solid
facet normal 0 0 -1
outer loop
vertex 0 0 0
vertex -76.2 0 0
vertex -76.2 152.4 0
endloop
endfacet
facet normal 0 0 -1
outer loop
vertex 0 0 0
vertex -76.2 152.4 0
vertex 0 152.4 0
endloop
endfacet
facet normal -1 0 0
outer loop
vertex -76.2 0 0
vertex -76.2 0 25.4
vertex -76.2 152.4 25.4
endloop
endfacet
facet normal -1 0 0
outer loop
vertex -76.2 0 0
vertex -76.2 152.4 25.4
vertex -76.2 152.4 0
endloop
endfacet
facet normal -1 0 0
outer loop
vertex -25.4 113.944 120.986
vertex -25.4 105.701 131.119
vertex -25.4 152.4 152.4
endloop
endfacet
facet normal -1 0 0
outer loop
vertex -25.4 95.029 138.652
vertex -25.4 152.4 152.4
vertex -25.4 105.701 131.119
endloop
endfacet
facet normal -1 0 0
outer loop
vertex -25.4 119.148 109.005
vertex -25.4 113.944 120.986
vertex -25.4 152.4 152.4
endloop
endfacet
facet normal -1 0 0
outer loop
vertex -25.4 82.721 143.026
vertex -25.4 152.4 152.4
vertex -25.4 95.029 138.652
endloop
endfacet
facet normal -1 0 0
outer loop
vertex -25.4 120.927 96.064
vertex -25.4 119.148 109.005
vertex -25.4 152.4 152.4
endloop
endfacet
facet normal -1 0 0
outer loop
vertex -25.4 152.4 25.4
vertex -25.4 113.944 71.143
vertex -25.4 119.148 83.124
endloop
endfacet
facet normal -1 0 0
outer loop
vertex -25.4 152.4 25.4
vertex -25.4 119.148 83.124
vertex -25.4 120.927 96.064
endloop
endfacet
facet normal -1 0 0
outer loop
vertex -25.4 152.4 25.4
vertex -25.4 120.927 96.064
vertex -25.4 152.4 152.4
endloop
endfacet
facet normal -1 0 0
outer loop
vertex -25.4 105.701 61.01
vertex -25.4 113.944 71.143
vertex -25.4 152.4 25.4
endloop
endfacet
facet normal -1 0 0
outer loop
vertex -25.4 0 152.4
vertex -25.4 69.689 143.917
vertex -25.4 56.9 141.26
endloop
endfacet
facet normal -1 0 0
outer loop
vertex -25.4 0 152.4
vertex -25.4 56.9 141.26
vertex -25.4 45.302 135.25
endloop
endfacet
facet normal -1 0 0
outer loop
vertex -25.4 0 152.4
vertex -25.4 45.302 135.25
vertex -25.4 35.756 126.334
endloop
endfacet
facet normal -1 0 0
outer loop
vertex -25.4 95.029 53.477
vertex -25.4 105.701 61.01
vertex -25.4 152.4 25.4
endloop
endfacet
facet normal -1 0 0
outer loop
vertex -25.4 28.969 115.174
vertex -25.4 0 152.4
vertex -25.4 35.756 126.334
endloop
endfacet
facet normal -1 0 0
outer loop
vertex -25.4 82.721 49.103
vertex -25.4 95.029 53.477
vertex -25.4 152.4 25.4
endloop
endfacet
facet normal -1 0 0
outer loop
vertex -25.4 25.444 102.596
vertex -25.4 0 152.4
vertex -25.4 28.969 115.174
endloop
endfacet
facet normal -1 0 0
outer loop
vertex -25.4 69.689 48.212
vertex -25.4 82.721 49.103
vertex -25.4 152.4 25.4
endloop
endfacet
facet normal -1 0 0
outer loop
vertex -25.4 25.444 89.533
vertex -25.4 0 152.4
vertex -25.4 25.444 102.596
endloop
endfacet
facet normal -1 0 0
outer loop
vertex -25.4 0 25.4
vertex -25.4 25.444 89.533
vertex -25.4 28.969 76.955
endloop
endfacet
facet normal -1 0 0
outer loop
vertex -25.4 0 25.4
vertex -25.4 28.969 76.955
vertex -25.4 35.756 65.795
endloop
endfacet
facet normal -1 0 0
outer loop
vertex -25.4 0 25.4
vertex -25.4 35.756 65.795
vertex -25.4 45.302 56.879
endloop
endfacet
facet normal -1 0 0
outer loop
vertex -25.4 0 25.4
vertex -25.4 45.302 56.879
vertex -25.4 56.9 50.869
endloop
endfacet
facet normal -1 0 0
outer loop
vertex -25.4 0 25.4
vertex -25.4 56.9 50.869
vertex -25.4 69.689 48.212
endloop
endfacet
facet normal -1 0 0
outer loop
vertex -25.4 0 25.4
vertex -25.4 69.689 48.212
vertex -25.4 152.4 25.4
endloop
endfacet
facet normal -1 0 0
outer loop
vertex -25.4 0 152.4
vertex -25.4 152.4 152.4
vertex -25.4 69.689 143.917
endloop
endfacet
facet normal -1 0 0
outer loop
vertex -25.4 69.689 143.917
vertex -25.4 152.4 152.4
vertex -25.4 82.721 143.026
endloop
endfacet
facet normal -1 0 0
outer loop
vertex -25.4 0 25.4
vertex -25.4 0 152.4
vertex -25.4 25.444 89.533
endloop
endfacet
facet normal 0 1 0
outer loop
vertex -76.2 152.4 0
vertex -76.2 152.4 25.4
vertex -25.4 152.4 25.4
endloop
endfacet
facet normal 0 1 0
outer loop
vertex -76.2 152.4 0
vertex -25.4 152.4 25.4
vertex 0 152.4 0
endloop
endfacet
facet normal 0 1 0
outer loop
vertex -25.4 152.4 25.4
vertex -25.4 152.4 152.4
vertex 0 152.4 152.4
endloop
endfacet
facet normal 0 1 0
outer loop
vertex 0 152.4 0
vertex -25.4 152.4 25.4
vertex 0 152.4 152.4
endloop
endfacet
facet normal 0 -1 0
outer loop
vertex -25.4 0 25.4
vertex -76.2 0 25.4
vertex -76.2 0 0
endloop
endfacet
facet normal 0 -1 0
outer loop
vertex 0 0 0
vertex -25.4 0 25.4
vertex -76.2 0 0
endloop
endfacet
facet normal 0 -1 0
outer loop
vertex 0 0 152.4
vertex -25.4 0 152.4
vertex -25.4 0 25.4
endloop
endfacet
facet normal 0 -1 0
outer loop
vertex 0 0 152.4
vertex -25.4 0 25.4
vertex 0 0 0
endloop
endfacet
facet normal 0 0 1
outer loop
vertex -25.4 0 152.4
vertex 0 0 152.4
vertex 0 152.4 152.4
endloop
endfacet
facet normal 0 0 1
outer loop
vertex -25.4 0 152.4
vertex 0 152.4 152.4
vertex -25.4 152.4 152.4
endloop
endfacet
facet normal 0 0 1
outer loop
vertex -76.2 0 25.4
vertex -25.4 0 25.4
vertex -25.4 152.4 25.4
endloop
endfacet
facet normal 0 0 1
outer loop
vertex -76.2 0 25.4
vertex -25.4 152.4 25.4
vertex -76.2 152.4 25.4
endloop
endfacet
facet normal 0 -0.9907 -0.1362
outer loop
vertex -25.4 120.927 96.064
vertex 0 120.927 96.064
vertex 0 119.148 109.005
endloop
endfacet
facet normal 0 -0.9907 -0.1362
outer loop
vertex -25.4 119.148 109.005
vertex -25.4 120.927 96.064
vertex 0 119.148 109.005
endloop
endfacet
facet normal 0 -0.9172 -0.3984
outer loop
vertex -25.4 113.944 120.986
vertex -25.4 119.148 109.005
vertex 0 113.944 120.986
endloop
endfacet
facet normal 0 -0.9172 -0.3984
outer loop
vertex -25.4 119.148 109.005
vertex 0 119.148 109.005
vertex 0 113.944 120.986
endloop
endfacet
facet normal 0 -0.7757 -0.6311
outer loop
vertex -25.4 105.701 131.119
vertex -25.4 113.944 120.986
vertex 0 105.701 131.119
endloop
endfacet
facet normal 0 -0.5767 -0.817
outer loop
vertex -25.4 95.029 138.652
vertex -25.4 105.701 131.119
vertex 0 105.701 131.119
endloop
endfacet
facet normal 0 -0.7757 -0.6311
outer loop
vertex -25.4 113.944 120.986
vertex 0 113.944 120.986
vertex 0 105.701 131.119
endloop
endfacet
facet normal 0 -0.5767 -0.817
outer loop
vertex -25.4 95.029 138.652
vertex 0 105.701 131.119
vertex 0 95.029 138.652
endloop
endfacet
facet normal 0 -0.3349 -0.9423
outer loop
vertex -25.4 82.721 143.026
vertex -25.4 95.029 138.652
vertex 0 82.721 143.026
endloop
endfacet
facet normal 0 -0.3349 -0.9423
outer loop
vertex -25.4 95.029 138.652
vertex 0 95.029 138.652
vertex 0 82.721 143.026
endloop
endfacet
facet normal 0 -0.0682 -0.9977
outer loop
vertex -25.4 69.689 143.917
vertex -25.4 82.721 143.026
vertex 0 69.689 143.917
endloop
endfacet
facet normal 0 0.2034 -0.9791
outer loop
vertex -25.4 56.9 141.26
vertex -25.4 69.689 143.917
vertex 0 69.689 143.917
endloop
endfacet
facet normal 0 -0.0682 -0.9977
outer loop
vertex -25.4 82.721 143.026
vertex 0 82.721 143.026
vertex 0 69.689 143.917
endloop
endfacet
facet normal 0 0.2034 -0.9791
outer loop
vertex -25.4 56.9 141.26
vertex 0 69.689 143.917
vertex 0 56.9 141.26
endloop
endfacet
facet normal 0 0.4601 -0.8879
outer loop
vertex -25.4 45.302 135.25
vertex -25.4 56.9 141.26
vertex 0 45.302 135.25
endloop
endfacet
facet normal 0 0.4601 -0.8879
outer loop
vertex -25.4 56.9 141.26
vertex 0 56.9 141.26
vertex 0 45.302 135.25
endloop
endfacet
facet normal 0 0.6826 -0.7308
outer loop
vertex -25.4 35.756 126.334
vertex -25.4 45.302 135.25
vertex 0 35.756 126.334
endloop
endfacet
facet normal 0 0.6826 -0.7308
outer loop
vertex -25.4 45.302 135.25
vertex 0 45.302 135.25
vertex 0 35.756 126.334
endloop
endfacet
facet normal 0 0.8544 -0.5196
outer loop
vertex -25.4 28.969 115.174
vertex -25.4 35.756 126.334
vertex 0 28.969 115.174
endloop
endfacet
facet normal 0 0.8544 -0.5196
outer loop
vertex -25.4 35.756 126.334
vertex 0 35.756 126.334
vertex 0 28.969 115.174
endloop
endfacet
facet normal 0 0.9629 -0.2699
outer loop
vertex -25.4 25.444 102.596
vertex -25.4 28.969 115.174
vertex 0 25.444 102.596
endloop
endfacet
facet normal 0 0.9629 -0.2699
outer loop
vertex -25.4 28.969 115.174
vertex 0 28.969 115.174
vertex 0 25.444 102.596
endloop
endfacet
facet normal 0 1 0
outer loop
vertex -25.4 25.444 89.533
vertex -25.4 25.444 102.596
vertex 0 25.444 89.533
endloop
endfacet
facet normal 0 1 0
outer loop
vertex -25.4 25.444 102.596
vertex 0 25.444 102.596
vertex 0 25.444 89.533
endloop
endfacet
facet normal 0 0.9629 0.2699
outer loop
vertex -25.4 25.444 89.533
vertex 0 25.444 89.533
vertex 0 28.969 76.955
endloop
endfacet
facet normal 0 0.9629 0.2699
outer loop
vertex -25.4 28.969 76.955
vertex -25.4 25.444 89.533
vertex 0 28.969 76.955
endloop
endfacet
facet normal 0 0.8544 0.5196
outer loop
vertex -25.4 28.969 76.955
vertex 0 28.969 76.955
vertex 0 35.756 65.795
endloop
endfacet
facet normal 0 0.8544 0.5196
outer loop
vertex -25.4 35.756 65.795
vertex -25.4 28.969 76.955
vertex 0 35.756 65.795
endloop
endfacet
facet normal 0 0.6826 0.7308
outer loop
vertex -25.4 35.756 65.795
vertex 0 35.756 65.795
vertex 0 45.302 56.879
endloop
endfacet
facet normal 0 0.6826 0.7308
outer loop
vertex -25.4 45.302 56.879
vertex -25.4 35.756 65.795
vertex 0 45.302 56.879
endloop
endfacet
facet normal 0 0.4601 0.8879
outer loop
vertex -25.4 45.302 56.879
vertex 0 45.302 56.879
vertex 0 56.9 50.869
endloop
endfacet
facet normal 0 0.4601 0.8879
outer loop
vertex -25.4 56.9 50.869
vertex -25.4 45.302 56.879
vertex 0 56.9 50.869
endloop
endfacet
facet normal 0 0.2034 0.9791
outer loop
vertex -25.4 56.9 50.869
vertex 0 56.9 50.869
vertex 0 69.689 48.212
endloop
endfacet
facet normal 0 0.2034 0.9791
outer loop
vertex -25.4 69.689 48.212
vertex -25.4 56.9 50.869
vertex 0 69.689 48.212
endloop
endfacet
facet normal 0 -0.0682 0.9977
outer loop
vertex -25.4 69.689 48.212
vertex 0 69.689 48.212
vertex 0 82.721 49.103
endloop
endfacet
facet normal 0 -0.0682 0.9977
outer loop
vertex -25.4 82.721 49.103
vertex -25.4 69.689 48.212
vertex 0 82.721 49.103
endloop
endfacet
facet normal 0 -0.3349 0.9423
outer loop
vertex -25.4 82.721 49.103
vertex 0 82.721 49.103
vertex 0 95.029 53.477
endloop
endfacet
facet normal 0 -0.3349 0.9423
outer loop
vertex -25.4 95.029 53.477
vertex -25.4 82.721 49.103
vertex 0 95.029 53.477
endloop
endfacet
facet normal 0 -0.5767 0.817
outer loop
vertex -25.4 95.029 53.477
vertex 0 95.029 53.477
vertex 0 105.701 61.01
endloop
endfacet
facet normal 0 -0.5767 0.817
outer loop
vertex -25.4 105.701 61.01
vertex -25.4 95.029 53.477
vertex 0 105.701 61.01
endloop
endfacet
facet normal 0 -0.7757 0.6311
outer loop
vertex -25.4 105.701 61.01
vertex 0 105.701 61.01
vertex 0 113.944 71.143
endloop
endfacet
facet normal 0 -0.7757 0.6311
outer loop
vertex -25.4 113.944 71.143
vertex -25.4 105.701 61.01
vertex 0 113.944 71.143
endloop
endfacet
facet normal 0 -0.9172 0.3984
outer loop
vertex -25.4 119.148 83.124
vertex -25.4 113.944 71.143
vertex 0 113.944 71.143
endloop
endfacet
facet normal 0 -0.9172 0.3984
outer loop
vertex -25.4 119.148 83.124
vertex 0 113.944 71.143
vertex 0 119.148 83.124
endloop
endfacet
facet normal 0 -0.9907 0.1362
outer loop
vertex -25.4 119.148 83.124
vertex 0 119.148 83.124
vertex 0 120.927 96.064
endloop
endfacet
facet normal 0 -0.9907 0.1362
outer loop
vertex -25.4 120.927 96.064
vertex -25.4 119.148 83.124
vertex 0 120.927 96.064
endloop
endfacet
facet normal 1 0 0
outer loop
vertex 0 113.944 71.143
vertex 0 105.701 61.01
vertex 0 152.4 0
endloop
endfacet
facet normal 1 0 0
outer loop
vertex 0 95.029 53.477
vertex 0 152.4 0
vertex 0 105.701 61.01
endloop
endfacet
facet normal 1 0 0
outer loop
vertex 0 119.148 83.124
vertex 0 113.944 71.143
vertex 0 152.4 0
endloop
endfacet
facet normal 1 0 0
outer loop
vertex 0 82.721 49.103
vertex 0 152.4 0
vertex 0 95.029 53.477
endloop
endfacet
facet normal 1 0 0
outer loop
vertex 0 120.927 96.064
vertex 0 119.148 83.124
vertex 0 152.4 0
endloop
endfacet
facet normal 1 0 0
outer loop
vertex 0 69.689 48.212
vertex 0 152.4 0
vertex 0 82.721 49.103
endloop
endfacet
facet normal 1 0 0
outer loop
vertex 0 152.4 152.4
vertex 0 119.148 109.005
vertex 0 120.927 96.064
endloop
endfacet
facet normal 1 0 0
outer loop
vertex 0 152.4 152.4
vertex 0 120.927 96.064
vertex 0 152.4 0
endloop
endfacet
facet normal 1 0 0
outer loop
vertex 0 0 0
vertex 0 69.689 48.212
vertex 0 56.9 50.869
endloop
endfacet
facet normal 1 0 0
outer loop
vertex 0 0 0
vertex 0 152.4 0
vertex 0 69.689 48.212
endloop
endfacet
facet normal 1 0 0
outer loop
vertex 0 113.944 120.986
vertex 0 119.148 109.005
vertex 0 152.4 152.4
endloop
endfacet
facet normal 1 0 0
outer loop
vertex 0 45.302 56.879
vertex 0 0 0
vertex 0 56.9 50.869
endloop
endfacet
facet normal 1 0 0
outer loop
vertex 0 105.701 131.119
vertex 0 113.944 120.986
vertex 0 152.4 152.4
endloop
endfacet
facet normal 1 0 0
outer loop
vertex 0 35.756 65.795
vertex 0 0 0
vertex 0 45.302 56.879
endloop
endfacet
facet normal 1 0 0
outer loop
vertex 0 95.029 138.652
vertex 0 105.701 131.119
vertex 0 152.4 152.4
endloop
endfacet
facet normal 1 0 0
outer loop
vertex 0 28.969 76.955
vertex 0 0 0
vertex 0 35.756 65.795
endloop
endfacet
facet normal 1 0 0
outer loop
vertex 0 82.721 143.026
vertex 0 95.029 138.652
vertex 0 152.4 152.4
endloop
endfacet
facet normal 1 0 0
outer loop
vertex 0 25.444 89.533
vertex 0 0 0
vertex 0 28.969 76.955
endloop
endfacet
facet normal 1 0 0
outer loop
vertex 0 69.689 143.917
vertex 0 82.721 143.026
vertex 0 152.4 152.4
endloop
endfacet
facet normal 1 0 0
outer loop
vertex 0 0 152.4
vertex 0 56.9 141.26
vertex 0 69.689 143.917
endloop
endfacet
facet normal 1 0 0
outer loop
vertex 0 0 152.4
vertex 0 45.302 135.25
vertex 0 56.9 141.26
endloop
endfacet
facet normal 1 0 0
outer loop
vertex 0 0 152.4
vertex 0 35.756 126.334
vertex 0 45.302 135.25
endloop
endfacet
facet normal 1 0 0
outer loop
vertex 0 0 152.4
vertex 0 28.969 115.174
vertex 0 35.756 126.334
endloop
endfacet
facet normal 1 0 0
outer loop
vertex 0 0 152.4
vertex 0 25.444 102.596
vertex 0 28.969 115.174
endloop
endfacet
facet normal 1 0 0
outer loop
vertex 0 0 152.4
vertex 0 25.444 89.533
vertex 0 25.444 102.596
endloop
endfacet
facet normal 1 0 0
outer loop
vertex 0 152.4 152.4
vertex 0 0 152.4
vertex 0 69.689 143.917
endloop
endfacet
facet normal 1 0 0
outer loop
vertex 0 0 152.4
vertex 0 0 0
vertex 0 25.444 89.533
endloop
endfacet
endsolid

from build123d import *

# Parameters (mm, degrees)
F1_DEPTH = 152.4
F2_R     = 47.9646820368
F3_DEPTH = 152.4


# Not quite as in the source:
# - a feature names something its author has since deleted; it is built from what else it names


with BuildPart() as f1:
    # F0 (on Front) → F1 (new body)
    with BuildSketch(Plane.XZ):
        Polygon((-76.2, 0), (0, 0), (0, 152.4), (-25.4, 152.4), (-25.4, 25.4), (-76.2, 25.4), align=None)
    extrude(amount=-F1_DEPTH)

    # F2 (on Right) → F3 (cut)
    with BuildSketch(Plane.YZ):
        with Locations((72.9622766376, 96.0644483566)):
            Circle(F2_R)
    extrude(amount=-F3_DEPTH, mode=Mode.SUBTRACT)


solid = f1.part
